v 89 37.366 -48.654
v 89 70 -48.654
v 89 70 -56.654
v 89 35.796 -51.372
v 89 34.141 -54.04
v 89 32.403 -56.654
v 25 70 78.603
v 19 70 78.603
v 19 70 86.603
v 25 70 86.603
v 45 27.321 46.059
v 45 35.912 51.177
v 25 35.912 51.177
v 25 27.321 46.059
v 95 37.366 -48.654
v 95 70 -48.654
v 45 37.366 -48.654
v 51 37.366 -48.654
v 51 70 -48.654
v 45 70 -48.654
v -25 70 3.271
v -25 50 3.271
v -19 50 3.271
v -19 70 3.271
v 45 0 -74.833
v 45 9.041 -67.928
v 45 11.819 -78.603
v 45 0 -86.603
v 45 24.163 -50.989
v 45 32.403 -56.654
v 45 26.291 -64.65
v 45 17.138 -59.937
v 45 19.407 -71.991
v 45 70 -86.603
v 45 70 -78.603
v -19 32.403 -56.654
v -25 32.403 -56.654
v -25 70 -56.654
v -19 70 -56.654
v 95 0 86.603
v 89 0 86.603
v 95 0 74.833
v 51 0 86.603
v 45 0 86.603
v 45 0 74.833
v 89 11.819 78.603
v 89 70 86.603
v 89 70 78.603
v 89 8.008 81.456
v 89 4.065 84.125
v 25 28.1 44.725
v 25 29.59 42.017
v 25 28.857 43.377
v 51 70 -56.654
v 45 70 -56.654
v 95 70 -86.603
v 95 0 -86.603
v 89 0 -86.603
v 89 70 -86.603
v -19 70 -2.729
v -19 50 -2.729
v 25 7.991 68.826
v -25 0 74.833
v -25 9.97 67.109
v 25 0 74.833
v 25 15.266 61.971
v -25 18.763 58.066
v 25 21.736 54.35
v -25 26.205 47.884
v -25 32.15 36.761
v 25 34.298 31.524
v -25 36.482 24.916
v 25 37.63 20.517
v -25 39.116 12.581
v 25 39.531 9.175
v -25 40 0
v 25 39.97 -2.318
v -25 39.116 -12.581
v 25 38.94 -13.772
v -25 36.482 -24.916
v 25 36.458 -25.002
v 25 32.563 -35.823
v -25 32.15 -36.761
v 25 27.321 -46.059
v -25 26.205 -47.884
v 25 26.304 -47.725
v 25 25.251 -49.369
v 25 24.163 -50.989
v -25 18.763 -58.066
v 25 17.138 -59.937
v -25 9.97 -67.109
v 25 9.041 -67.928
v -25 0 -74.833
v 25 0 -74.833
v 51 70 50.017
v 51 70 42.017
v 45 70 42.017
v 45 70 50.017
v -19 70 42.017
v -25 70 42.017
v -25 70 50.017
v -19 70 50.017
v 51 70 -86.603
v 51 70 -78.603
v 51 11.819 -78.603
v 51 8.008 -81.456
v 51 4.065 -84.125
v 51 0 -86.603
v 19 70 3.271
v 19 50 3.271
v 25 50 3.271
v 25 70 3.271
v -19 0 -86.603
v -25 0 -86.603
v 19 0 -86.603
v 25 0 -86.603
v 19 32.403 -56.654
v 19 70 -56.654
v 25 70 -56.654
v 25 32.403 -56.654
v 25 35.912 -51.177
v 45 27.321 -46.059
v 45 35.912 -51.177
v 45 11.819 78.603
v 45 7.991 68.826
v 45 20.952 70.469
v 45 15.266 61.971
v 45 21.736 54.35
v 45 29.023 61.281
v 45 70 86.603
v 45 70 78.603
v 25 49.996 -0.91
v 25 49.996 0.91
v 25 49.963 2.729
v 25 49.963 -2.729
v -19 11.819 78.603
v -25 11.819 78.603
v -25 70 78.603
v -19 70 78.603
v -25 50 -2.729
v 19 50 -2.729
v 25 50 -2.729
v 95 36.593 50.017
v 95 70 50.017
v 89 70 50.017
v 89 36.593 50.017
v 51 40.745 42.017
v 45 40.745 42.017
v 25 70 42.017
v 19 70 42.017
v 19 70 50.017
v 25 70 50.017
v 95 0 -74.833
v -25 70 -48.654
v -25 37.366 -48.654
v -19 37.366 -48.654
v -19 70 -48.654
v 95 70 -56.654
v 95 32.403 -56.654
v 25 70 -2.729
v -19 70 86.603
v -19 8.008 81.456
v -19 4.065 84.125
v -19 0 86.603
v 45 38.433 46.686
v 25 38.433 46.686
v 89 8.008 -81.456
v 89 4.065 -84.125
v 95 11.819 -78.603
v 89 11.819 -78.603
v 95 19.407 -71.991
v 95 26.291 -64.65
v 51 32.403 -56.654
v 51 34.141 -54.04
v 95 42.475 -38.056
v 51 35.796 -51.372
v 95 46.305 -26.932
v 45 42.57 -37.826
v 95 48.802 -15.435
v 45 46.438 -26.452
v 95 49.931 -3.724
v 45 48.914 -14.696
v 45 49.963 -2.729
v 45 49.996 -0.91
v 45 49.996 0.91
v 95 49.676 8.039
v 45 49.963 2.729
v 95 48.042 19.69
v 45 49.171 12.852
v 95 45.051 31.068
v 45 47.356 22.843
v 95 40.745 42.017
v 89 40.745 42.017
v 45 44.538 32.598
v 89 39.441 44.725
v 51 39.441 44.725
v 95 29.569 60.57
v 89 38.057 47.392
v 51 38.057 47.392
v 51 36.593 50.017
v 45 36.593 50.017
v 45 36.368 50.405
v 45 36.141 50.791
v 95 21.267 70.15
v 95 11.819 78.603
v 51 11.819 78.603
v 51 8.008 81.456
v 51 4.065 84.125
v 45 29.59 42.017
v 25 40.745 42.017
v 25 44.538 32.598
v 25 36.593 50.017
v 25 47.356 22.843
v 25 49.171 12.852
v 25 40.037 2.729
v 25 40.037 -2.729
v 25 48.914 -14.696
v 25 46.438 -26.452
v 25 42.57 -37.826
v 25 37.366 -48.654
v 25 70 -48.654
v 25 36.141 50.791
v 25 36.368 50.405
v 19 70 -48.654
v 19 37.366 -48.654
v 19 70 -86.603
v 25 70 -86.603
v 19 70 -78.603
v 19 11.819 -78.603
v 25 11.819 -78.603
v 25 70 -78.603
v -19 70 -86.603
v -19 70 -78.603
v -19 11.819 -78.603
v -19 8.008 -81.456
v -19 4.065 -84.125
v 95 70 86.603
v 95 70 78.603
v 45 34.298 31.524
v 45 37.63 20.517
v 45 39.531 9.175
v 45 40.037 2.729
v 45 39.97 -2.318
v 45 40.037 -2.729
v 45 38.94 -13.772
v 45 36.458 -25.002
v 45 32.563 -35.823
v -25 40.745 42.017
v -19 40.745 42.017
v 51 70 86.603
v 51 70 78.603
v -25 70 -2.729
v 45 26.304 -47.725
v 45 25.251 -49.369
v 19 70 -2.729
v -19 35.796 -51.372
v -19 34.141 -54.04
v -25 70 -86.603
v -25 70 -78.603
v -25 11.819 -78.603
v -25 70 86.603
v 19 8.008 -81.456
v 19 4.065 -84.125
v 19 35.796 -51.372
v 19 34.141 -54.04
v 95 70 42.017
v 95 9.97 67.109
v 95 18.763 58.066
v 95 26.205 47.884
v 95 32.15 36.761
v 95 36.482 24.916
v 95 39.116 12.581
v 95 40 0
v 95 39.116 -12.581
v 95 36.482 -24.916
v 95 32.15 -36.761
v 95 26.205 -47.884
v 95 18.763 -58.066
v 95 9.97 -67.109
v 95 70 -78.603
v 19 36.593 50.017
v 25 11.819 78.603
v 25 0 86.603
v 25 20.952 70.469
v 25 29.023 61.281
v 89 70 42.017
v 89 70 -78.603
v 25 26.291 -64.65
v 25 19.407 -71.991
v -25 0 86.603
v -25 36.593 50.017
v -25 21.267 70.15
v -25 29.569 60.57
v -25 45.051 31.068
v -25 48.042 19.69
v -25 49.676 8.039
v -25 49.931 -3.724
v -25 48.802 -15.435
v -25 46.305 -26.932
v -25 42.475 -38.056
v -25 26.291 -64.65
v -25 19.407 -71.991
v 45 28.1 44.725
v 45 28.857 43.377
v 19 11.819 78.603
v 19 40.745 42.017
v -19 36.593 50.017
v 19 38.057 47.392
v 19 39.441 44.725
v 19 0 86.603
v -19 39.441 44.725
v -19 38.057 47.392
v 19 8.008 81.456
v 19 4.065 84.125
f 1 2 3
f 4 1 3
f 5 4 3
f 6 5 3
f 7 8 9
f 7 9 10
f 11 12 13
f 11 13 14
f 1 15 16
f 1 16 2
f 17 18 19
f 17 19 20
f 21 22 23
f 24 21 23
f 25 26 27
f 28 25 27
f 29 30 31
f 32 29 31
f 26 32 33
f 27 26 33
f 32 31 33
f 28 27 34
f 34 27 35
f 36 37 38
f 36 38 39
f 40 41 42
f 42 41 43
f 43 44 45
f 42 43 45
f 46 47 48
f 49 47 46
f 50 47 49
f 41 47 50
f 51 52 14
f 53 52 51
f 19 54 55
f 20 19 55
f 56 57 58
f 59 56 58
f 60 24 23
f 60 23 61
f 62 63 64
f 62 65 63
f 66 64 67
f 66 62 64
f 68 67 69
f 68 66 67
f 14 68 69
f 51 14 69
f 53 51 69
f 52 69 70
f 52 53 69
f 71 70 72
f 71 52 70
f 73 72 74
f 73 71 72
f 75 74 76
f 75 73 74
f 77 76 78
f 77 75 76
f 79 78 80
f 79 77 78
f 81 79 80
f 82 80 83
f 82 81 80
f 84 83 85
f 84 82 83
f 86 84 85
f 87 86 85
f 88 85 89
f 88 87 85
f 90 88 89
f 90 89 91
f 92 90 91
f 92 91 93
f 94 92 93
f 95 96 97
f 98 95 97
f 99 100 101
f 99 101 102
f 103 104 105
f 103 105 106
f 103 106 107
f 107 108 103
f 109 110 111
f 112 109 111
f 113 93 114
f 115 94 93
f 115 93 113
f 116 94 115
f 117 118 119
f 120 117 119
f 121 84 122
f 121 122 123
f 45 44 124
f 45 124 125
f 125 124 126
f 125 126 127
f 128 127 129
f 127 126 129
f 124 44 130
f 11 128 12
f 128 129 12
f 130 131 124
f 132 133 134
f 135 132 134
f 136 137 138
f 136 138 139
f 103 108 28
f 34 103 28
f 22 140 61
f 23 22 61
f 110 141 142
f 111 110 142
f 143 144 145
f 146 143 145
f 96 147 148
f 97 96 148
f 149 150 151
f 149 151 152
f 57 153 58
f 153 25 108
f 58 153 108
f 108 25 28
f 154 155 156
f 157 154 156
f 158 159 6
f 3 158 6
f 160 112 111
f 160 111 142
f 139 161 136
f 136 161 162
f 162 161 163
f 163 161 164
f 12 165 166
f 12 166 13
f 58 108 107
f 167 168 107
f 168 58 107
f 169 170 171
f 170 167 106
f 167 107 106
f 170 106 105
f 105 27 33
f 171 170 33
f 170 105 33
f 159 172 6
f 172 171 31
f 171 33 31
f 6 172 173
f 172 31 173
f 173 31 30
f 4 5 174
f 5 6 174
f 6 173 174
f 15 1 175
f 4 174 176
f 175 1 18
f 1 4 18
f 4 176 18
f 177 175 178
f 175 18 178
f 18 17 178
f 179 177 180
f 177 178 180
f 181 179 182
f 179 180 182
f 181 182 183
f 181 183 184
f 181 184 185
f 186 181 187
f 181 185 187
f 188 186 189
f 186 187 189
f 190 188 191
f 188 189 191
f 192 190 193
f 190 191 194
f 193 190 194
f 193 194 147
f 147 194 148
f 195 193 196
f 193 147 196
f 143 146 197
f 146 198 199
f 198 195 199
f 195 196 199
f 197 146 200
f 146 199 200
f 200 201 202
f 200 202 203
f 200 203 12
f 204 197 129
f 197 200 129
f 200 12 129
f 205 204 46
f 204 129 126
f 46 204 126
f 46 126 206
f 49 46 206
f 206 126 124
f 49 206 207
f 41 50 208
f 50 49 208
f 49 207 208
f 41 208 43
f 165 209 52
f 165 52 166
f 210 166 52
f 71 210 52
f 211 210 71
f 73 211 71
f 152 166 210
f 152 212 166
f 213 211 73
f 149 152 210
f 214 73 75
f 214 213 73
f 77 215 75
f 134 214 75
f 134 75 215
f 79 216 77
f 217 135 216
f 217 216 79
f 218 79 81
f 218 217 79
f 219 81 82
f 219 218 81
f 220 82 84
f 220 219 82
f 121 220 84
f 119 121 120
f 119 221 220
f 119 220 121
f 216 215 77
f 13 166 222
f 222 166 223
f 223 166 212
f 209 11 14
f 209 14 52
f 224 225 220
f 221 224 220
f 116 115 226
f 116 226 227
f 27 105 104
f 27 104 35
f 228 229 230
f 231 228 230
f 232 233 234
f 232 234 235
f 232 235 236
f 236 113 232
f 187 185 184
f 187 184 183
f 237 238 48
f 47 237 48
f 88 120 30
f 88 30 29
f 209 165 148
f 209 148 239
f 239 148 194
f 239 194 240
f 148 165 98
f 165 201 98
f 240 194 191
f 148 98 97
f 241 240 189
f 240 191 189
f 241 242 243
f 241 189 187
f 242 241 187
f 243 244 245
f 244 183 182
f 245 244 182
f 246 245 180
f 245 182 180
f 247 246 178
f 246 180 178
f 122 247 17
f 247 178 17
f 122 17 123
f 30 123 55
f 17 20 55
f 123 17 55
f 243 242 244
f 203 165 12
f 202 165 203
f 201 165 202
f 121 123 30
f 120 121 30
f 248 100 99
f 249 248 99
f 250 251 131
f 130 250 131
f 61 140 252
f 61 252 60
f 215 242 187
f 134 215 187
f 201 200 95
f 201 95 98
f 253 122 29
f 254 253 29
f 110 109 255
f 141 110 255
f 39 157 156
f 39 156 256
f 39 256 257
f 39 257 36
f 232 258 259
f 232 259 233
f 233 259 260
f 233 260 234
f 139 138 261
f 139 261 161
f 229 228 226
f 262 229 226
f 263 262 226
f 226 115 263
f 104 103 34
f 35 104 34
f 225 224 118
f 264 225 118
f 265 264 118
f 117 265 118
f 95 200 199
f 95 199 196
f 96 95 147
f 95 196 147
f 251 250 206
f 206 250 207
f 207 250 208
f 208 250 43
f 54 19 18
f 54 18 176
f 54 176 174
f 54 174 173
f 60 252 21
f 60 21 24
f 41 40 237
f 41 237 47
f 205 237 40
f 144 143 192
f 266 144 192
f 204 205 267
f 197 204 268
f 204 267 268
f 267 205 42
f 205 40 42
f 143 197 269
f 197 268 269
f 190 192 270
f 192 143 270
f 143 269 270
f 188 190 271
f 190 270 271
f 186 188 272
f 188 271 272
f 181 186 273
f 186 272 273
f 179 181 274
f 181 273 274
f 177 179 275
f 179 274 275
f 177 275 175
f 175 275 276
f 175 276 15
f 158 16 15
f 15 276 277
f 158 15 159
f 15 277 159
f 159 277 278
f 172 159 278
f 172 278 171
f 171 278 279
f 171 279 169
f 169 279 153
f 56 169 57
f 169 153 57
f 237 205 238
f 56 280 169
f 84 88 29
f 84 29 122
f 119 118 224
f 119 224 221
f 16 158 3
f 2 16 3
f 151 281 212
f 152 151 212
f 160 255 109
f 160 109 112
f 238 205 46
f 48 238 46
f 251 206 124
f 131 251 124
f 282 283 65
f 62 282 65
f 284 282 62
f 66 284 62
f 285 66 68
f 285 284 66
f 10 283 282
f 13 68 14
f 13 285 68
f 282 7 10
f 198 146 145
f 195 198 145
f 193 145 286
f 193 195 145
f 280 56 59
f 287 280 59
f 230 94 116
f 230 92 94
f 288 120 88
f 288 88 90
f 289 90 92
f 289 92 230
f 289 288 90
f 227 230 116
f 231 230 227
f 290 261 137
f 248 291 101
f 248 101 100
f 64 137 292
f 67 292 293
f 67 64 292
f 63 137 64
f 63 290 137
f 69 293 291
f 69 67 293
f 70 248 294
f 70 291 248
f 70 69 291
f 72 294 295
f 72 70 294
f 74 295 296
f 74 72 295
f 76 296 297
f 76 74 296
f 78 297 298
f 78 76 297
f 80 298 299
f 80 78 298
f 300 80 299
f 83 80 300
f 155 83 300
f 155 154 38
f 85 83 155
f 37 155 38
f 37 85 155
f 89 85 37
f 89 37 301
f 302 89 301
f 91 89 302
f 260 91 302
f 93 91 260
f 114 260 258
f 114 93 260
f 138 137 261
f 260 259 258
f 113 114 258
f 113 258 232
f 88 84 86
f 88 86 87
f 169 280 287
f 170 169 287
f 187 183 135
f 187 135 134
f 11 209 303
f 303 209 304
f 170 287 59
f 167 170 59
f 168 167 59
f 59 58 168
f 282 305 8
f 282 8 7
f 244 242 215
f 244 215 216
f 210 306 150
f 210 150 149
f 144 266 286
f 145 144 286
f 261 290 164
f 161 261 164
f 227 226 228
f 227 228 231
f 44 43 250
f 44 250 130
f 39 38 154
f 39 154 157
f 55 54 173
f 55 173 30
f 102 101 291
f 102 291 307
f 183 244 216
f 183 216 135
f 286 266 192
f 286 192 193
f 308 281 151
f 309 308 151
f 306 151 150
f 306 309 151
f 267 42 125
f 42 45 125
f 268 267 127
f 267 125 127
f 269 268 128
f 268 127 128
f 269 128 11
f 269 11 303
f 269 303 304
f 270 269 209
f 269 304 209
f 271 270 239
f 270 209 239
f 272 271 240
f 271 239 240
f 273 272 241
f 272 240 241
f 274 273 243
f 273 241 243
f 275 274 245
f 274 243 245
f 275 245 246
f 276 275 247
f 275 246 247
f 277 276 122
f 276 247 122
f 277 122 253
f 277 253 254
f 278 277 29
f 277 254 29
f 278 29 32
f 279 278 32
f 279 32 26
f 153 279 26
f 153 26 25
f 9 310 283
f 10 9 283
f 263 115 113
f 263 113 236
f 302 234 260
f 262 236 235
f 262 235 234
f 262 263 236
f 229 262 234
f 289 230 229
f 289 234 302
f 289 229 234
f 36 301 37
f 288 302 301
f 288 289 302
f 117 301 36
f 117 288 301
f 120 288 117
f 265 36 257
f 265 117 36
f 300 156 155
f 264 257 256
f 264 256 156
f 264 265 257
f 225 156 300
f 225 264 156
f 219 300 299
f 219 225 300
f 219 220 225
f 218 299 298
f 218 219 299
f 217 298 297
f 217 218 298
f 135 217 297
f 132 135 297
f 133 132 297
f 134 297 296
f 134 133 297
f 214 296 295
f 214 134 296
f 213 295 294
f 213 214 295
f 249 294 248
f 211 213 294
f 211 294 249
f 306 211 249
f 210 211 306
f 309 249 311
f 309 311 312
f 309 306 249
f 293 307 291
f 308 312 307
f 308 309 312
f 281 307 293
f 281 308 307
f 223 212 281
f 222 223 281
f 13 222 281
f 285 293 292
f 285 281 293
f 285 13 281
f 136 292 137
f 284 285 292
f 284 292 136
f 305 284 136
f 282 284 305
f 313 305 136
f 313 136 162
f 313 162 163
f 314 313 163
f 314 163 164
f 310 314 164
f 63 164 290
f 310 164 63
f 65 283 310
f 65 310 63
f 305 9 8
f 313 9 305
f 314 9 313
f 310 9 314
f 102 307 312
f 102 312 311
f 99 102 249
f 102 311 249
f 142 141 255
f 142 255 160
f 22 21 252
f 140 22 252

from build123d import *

# Parameters (mm, degrees)
BOSS_EXTRUDE1_DEPTH   = 25
SKETCH5_W             = 2.728546834
SKETCH5_H             = 9.92553646
BOSS_EXTRUDE3_DEPTH   = 10
BOSS_EXTRUDE4_DEPTH   = 10
BOSS_EXTRUDE5_START   = -50
SKETCH7_W             = 6
SKETCH7_H             = 8
BOSS_EXTRUDE5_DEPTH   = 70
BOSS_EXTRUDE6_START   = -50
SKETCH7_3_W           = 6
SKETCH7_3_H           = 8
BOSS_EXTRUDE6_DEPTH   = 70
BOSS_EXTRUDE7_START   = -19
SKETCH7_4_W           = 6
SKETCH7_4_H           = 8
BOSS_EXTRUDE7_DEPTH   = 39
SKETCH7_5_W           = 6
SKETCH7_5_H           = 6
BOSS_EXTRUDE8_DEPTH   = 20
BOSS_EXTRUDE8_2_DEPTH = 20
BOSS_EXTRUDE9_START   = -24
SKETCH7_6_W           = 6
SKETCH7_6_H           = 8
BOSS_EXTRUDE9_DEPTH   = 44
BOSS_EXTRUDE10_START  = -50
SKETCH7_7_W           = 6
SKETCH7_7_H           = 8
BOSS_EXTRUDE10_DEPTH  = 70


with BuildPart() as part:
    # Sketch2 → Boss-Extrude1 (new, symmetric)
    with BuildSketch(Plane(origin=(0, 0, 0), x_dir=(0, 0, -1), z_dir=(1, 0, 0))):
        with BuildLine():
            Line((74.833147735, 0), (86.602540378, 0))
            ThreePointArc((86.602540378, 0), (0, 50), (-86.602540378, 0))
            Line((-86.602540378, 0), (-74.833147735, 0))
            ThreePointArc((-74.833147735, 0), (0, 40), (74.833147735, 0))
        make_face()
    boss_extrude1 = extrude(amount=BOSS_EXTRUDE1_DEPTH, both=True)

    # Sketch5 → Boss-Extrude3 (add)
    with BuildSketch(Plane(origin=(25, 0, 0), x_dir=(0, 0, -1), z_dir=(1, 0, 0))):
        with Locations((-1.364273417, 45)):
            Rectangle(SKETCH5_W, SKETCH5_H)
        with Locations((1.364273417, 45)):
            Rectangle(SKETCH5_W, SKETCH5_H)
    boss_extrude3 = extrude(amount=BOSS_EXTRUDE3_DEPTH)

    # Sketch6 → Boss-Extrude4 (add)
    with BuildSketch(Plane(origin=(25, 0, 0), x_dir=(0, 0, -1), z_dir=(1, 0, 0))):
        Polygon((-51.176951237, 35.912278878), (-46.059256113, 27.321050991), (-42.017037291, 29.590002999), (-46.68559699, 38.433336665), align=None)
        Polygon((46.059256113, 27.321050991), (51.176951237, 35.912278878), (56.654177251, 32.403302118), (50.988759526, 24.162971906), align=None)
    boss_extrude4 = extrude(amount=BOSS_EXTRUDE4_DEPTH)

    # Sketch7 → Boss-Extrude5 (add)
    with BuildSketch(Plane(origin=(0, 50, 0), x_dir=(1, 0, 0), z_dir=(0, 1, 0)).offset(BOSS_EXTRUDE5_START)):
        with Locations((22, -82.602540378)):
            Rectangle(SKETCH7_W, SKETCH7_H)
    boss_extrude5 = extrude(amount=BOSS_EXTRUDE5_DEPTH)

    # Sketch7_3 → Boss-Extrude6 (add)
    with BuildSketch(Plane(origin=(0, 50, 0), x_dir=(1, 0, 0), z_dir=(0, 1, 0)).offset(BOSS_EXTRUDE6_START)):
        with Locations((-22, -82.602540378)):
            Rectangle(SKETCH7_3_W, SKETCH7_3_H)
    boss_extrude6 = extrude(amount=BOSS_EXTRUDE6_DEPTH)

    # Sketch7_4 → Boss-Extrude7 (add)
    with BuildSketch(Plane(origin=(0, 50, 0), x_dir=(1, 0, 0), z_dir=(0, 1, 0)).offset(BOSS_EXTRUDE7_START)):
        with Locations((22, -46.017037291)):
            Rectangle(SKETCH7_4_W, SKETCH7_4_H)
        with Locations((-22, -46.017037291)):
            Rectangle(SKETCH7_4_W, SKETCH7_4_H)
    boss_extrude7 = extrude(amount=BOSS_EXTRUDE7_DEPTH)

    # Sketch7_6 → Boss-Extrude9 (add)
    with BuildSketch(Plane(origin=(0, 50, 0), x_dir=(1, 0, 0), z_dir=(0, 1, 0)).offset(BOSS_EXTRUDE9_START)):
        with Locations((22, 52.654177251)):
            Rectangle(SKETCH7_6_W, SKETCH7_6_H)
        with Locations((-22, 52.654177251)):
            Rectangle(SKETCH7_6_W, SKETCH7_6_H)
    boss_extrude9 = extrude(amount=BOSS_EXTRUDE9_DEPTH)

    # Sketch7_7 → Boss-Extrude10 (add)
    with BuildSketch(Plane(origin=(0, 50, 0), x_dir=(1, 0, 0), z_dir=(0, 1, 0)).offset(BOSS_EXTRUDE10_START)):
        with Locations((22, 82.602540378)):
            Rectangle(SKETCH7_7_W, SKETCH7_7_H)
        with Locations((-22, 82.602540378)):
            Rectangle(SKETCH7_7_W, SKETCH7_7_H)
    boss_extrude10 = extrude(amount=BOSS_EXTRUDE10_DEPTH)

    # Mirror7: Boss-Extrude1, Boss-Extrude3, Boss-Extrude4, Boss-Extrude5, Boss-Extrude6, Boss-Extrude7, Boss-Extrude9, Boss-Extrude10 across plane
    add(boss_extrude1.mirror(Plane(origin=(35, 0, 0), x_dir=(0, 0, 1), z_dir=(1, 0, 0))))
    add(boss_extrude3.mirror(Plane(origin=(35, 0, 0), x_dir=(0, 0, 1), z_dir=(1, 0, 0))))
    add(boss_extrude4.mirror(Plane(origin=(35, 0, 0), x_dir=(0, 0, 1), z_dir=(1, 0, 0))))
    add(boss_extrude5.mirror(Plane(origin=(35, 0, 0), x_dir=(0, 0, 1), z_dir=(1, 0, 0))))
    add(boss_extrude6.mirror(Plane(origin=(35, 0, 0), x_dir=(0, 0, 1), z_dir=(1, 0, 0))))
    add(boss_extrude7.mirror(Plane(origin=(35, 0, 0), x_dir=(0, 0, 1), z_dir=(1, 0, 0))))
    add(boss_extrude9.mirror(Plane(origin=(35, 0, 0), x_dir=(0, 0, 1), z_dir=(1, 0, 0))))
    add(boss_extrude10.mirror(Plane(origin=(35, 0, 0), x_dir=(0, 0, 1), z_dir=(1, 0, 0))))


with BuildPart() as body_2:
    # Sketch7_5 → Boss-Extrude8 (new body)
    with BuildSketch(Plane(origin=(0, 50, 0), x_dir=(1, 0, 0), z_dir=(0, 1, 0))):
        with Locations((22, -0.271453166)):
            Rectangle(SKETCH7_5_W, SKETCH7_5_H)
    extrude(amount=BOSS_EXTRUDE8_DEPTH)


with BuildPart() as body_3:
    # Sketch7_5 → Boss-Extrude8 2 (new body)
    with BuildSketch(Plane(origin=(0, 50, 0), x_dir=(1, 0, 0), z_dir=(0, 1, 0))):
        with Locations((-22, -0.271453166)):
            Rectangle(SKETCH7_5_W, SKETCH7_5_H)
    extrude(amount=BOSS_EXTRUDE8_2_DEPTH)


solid = Compound([part.part, body_2.part, body_3.part])
